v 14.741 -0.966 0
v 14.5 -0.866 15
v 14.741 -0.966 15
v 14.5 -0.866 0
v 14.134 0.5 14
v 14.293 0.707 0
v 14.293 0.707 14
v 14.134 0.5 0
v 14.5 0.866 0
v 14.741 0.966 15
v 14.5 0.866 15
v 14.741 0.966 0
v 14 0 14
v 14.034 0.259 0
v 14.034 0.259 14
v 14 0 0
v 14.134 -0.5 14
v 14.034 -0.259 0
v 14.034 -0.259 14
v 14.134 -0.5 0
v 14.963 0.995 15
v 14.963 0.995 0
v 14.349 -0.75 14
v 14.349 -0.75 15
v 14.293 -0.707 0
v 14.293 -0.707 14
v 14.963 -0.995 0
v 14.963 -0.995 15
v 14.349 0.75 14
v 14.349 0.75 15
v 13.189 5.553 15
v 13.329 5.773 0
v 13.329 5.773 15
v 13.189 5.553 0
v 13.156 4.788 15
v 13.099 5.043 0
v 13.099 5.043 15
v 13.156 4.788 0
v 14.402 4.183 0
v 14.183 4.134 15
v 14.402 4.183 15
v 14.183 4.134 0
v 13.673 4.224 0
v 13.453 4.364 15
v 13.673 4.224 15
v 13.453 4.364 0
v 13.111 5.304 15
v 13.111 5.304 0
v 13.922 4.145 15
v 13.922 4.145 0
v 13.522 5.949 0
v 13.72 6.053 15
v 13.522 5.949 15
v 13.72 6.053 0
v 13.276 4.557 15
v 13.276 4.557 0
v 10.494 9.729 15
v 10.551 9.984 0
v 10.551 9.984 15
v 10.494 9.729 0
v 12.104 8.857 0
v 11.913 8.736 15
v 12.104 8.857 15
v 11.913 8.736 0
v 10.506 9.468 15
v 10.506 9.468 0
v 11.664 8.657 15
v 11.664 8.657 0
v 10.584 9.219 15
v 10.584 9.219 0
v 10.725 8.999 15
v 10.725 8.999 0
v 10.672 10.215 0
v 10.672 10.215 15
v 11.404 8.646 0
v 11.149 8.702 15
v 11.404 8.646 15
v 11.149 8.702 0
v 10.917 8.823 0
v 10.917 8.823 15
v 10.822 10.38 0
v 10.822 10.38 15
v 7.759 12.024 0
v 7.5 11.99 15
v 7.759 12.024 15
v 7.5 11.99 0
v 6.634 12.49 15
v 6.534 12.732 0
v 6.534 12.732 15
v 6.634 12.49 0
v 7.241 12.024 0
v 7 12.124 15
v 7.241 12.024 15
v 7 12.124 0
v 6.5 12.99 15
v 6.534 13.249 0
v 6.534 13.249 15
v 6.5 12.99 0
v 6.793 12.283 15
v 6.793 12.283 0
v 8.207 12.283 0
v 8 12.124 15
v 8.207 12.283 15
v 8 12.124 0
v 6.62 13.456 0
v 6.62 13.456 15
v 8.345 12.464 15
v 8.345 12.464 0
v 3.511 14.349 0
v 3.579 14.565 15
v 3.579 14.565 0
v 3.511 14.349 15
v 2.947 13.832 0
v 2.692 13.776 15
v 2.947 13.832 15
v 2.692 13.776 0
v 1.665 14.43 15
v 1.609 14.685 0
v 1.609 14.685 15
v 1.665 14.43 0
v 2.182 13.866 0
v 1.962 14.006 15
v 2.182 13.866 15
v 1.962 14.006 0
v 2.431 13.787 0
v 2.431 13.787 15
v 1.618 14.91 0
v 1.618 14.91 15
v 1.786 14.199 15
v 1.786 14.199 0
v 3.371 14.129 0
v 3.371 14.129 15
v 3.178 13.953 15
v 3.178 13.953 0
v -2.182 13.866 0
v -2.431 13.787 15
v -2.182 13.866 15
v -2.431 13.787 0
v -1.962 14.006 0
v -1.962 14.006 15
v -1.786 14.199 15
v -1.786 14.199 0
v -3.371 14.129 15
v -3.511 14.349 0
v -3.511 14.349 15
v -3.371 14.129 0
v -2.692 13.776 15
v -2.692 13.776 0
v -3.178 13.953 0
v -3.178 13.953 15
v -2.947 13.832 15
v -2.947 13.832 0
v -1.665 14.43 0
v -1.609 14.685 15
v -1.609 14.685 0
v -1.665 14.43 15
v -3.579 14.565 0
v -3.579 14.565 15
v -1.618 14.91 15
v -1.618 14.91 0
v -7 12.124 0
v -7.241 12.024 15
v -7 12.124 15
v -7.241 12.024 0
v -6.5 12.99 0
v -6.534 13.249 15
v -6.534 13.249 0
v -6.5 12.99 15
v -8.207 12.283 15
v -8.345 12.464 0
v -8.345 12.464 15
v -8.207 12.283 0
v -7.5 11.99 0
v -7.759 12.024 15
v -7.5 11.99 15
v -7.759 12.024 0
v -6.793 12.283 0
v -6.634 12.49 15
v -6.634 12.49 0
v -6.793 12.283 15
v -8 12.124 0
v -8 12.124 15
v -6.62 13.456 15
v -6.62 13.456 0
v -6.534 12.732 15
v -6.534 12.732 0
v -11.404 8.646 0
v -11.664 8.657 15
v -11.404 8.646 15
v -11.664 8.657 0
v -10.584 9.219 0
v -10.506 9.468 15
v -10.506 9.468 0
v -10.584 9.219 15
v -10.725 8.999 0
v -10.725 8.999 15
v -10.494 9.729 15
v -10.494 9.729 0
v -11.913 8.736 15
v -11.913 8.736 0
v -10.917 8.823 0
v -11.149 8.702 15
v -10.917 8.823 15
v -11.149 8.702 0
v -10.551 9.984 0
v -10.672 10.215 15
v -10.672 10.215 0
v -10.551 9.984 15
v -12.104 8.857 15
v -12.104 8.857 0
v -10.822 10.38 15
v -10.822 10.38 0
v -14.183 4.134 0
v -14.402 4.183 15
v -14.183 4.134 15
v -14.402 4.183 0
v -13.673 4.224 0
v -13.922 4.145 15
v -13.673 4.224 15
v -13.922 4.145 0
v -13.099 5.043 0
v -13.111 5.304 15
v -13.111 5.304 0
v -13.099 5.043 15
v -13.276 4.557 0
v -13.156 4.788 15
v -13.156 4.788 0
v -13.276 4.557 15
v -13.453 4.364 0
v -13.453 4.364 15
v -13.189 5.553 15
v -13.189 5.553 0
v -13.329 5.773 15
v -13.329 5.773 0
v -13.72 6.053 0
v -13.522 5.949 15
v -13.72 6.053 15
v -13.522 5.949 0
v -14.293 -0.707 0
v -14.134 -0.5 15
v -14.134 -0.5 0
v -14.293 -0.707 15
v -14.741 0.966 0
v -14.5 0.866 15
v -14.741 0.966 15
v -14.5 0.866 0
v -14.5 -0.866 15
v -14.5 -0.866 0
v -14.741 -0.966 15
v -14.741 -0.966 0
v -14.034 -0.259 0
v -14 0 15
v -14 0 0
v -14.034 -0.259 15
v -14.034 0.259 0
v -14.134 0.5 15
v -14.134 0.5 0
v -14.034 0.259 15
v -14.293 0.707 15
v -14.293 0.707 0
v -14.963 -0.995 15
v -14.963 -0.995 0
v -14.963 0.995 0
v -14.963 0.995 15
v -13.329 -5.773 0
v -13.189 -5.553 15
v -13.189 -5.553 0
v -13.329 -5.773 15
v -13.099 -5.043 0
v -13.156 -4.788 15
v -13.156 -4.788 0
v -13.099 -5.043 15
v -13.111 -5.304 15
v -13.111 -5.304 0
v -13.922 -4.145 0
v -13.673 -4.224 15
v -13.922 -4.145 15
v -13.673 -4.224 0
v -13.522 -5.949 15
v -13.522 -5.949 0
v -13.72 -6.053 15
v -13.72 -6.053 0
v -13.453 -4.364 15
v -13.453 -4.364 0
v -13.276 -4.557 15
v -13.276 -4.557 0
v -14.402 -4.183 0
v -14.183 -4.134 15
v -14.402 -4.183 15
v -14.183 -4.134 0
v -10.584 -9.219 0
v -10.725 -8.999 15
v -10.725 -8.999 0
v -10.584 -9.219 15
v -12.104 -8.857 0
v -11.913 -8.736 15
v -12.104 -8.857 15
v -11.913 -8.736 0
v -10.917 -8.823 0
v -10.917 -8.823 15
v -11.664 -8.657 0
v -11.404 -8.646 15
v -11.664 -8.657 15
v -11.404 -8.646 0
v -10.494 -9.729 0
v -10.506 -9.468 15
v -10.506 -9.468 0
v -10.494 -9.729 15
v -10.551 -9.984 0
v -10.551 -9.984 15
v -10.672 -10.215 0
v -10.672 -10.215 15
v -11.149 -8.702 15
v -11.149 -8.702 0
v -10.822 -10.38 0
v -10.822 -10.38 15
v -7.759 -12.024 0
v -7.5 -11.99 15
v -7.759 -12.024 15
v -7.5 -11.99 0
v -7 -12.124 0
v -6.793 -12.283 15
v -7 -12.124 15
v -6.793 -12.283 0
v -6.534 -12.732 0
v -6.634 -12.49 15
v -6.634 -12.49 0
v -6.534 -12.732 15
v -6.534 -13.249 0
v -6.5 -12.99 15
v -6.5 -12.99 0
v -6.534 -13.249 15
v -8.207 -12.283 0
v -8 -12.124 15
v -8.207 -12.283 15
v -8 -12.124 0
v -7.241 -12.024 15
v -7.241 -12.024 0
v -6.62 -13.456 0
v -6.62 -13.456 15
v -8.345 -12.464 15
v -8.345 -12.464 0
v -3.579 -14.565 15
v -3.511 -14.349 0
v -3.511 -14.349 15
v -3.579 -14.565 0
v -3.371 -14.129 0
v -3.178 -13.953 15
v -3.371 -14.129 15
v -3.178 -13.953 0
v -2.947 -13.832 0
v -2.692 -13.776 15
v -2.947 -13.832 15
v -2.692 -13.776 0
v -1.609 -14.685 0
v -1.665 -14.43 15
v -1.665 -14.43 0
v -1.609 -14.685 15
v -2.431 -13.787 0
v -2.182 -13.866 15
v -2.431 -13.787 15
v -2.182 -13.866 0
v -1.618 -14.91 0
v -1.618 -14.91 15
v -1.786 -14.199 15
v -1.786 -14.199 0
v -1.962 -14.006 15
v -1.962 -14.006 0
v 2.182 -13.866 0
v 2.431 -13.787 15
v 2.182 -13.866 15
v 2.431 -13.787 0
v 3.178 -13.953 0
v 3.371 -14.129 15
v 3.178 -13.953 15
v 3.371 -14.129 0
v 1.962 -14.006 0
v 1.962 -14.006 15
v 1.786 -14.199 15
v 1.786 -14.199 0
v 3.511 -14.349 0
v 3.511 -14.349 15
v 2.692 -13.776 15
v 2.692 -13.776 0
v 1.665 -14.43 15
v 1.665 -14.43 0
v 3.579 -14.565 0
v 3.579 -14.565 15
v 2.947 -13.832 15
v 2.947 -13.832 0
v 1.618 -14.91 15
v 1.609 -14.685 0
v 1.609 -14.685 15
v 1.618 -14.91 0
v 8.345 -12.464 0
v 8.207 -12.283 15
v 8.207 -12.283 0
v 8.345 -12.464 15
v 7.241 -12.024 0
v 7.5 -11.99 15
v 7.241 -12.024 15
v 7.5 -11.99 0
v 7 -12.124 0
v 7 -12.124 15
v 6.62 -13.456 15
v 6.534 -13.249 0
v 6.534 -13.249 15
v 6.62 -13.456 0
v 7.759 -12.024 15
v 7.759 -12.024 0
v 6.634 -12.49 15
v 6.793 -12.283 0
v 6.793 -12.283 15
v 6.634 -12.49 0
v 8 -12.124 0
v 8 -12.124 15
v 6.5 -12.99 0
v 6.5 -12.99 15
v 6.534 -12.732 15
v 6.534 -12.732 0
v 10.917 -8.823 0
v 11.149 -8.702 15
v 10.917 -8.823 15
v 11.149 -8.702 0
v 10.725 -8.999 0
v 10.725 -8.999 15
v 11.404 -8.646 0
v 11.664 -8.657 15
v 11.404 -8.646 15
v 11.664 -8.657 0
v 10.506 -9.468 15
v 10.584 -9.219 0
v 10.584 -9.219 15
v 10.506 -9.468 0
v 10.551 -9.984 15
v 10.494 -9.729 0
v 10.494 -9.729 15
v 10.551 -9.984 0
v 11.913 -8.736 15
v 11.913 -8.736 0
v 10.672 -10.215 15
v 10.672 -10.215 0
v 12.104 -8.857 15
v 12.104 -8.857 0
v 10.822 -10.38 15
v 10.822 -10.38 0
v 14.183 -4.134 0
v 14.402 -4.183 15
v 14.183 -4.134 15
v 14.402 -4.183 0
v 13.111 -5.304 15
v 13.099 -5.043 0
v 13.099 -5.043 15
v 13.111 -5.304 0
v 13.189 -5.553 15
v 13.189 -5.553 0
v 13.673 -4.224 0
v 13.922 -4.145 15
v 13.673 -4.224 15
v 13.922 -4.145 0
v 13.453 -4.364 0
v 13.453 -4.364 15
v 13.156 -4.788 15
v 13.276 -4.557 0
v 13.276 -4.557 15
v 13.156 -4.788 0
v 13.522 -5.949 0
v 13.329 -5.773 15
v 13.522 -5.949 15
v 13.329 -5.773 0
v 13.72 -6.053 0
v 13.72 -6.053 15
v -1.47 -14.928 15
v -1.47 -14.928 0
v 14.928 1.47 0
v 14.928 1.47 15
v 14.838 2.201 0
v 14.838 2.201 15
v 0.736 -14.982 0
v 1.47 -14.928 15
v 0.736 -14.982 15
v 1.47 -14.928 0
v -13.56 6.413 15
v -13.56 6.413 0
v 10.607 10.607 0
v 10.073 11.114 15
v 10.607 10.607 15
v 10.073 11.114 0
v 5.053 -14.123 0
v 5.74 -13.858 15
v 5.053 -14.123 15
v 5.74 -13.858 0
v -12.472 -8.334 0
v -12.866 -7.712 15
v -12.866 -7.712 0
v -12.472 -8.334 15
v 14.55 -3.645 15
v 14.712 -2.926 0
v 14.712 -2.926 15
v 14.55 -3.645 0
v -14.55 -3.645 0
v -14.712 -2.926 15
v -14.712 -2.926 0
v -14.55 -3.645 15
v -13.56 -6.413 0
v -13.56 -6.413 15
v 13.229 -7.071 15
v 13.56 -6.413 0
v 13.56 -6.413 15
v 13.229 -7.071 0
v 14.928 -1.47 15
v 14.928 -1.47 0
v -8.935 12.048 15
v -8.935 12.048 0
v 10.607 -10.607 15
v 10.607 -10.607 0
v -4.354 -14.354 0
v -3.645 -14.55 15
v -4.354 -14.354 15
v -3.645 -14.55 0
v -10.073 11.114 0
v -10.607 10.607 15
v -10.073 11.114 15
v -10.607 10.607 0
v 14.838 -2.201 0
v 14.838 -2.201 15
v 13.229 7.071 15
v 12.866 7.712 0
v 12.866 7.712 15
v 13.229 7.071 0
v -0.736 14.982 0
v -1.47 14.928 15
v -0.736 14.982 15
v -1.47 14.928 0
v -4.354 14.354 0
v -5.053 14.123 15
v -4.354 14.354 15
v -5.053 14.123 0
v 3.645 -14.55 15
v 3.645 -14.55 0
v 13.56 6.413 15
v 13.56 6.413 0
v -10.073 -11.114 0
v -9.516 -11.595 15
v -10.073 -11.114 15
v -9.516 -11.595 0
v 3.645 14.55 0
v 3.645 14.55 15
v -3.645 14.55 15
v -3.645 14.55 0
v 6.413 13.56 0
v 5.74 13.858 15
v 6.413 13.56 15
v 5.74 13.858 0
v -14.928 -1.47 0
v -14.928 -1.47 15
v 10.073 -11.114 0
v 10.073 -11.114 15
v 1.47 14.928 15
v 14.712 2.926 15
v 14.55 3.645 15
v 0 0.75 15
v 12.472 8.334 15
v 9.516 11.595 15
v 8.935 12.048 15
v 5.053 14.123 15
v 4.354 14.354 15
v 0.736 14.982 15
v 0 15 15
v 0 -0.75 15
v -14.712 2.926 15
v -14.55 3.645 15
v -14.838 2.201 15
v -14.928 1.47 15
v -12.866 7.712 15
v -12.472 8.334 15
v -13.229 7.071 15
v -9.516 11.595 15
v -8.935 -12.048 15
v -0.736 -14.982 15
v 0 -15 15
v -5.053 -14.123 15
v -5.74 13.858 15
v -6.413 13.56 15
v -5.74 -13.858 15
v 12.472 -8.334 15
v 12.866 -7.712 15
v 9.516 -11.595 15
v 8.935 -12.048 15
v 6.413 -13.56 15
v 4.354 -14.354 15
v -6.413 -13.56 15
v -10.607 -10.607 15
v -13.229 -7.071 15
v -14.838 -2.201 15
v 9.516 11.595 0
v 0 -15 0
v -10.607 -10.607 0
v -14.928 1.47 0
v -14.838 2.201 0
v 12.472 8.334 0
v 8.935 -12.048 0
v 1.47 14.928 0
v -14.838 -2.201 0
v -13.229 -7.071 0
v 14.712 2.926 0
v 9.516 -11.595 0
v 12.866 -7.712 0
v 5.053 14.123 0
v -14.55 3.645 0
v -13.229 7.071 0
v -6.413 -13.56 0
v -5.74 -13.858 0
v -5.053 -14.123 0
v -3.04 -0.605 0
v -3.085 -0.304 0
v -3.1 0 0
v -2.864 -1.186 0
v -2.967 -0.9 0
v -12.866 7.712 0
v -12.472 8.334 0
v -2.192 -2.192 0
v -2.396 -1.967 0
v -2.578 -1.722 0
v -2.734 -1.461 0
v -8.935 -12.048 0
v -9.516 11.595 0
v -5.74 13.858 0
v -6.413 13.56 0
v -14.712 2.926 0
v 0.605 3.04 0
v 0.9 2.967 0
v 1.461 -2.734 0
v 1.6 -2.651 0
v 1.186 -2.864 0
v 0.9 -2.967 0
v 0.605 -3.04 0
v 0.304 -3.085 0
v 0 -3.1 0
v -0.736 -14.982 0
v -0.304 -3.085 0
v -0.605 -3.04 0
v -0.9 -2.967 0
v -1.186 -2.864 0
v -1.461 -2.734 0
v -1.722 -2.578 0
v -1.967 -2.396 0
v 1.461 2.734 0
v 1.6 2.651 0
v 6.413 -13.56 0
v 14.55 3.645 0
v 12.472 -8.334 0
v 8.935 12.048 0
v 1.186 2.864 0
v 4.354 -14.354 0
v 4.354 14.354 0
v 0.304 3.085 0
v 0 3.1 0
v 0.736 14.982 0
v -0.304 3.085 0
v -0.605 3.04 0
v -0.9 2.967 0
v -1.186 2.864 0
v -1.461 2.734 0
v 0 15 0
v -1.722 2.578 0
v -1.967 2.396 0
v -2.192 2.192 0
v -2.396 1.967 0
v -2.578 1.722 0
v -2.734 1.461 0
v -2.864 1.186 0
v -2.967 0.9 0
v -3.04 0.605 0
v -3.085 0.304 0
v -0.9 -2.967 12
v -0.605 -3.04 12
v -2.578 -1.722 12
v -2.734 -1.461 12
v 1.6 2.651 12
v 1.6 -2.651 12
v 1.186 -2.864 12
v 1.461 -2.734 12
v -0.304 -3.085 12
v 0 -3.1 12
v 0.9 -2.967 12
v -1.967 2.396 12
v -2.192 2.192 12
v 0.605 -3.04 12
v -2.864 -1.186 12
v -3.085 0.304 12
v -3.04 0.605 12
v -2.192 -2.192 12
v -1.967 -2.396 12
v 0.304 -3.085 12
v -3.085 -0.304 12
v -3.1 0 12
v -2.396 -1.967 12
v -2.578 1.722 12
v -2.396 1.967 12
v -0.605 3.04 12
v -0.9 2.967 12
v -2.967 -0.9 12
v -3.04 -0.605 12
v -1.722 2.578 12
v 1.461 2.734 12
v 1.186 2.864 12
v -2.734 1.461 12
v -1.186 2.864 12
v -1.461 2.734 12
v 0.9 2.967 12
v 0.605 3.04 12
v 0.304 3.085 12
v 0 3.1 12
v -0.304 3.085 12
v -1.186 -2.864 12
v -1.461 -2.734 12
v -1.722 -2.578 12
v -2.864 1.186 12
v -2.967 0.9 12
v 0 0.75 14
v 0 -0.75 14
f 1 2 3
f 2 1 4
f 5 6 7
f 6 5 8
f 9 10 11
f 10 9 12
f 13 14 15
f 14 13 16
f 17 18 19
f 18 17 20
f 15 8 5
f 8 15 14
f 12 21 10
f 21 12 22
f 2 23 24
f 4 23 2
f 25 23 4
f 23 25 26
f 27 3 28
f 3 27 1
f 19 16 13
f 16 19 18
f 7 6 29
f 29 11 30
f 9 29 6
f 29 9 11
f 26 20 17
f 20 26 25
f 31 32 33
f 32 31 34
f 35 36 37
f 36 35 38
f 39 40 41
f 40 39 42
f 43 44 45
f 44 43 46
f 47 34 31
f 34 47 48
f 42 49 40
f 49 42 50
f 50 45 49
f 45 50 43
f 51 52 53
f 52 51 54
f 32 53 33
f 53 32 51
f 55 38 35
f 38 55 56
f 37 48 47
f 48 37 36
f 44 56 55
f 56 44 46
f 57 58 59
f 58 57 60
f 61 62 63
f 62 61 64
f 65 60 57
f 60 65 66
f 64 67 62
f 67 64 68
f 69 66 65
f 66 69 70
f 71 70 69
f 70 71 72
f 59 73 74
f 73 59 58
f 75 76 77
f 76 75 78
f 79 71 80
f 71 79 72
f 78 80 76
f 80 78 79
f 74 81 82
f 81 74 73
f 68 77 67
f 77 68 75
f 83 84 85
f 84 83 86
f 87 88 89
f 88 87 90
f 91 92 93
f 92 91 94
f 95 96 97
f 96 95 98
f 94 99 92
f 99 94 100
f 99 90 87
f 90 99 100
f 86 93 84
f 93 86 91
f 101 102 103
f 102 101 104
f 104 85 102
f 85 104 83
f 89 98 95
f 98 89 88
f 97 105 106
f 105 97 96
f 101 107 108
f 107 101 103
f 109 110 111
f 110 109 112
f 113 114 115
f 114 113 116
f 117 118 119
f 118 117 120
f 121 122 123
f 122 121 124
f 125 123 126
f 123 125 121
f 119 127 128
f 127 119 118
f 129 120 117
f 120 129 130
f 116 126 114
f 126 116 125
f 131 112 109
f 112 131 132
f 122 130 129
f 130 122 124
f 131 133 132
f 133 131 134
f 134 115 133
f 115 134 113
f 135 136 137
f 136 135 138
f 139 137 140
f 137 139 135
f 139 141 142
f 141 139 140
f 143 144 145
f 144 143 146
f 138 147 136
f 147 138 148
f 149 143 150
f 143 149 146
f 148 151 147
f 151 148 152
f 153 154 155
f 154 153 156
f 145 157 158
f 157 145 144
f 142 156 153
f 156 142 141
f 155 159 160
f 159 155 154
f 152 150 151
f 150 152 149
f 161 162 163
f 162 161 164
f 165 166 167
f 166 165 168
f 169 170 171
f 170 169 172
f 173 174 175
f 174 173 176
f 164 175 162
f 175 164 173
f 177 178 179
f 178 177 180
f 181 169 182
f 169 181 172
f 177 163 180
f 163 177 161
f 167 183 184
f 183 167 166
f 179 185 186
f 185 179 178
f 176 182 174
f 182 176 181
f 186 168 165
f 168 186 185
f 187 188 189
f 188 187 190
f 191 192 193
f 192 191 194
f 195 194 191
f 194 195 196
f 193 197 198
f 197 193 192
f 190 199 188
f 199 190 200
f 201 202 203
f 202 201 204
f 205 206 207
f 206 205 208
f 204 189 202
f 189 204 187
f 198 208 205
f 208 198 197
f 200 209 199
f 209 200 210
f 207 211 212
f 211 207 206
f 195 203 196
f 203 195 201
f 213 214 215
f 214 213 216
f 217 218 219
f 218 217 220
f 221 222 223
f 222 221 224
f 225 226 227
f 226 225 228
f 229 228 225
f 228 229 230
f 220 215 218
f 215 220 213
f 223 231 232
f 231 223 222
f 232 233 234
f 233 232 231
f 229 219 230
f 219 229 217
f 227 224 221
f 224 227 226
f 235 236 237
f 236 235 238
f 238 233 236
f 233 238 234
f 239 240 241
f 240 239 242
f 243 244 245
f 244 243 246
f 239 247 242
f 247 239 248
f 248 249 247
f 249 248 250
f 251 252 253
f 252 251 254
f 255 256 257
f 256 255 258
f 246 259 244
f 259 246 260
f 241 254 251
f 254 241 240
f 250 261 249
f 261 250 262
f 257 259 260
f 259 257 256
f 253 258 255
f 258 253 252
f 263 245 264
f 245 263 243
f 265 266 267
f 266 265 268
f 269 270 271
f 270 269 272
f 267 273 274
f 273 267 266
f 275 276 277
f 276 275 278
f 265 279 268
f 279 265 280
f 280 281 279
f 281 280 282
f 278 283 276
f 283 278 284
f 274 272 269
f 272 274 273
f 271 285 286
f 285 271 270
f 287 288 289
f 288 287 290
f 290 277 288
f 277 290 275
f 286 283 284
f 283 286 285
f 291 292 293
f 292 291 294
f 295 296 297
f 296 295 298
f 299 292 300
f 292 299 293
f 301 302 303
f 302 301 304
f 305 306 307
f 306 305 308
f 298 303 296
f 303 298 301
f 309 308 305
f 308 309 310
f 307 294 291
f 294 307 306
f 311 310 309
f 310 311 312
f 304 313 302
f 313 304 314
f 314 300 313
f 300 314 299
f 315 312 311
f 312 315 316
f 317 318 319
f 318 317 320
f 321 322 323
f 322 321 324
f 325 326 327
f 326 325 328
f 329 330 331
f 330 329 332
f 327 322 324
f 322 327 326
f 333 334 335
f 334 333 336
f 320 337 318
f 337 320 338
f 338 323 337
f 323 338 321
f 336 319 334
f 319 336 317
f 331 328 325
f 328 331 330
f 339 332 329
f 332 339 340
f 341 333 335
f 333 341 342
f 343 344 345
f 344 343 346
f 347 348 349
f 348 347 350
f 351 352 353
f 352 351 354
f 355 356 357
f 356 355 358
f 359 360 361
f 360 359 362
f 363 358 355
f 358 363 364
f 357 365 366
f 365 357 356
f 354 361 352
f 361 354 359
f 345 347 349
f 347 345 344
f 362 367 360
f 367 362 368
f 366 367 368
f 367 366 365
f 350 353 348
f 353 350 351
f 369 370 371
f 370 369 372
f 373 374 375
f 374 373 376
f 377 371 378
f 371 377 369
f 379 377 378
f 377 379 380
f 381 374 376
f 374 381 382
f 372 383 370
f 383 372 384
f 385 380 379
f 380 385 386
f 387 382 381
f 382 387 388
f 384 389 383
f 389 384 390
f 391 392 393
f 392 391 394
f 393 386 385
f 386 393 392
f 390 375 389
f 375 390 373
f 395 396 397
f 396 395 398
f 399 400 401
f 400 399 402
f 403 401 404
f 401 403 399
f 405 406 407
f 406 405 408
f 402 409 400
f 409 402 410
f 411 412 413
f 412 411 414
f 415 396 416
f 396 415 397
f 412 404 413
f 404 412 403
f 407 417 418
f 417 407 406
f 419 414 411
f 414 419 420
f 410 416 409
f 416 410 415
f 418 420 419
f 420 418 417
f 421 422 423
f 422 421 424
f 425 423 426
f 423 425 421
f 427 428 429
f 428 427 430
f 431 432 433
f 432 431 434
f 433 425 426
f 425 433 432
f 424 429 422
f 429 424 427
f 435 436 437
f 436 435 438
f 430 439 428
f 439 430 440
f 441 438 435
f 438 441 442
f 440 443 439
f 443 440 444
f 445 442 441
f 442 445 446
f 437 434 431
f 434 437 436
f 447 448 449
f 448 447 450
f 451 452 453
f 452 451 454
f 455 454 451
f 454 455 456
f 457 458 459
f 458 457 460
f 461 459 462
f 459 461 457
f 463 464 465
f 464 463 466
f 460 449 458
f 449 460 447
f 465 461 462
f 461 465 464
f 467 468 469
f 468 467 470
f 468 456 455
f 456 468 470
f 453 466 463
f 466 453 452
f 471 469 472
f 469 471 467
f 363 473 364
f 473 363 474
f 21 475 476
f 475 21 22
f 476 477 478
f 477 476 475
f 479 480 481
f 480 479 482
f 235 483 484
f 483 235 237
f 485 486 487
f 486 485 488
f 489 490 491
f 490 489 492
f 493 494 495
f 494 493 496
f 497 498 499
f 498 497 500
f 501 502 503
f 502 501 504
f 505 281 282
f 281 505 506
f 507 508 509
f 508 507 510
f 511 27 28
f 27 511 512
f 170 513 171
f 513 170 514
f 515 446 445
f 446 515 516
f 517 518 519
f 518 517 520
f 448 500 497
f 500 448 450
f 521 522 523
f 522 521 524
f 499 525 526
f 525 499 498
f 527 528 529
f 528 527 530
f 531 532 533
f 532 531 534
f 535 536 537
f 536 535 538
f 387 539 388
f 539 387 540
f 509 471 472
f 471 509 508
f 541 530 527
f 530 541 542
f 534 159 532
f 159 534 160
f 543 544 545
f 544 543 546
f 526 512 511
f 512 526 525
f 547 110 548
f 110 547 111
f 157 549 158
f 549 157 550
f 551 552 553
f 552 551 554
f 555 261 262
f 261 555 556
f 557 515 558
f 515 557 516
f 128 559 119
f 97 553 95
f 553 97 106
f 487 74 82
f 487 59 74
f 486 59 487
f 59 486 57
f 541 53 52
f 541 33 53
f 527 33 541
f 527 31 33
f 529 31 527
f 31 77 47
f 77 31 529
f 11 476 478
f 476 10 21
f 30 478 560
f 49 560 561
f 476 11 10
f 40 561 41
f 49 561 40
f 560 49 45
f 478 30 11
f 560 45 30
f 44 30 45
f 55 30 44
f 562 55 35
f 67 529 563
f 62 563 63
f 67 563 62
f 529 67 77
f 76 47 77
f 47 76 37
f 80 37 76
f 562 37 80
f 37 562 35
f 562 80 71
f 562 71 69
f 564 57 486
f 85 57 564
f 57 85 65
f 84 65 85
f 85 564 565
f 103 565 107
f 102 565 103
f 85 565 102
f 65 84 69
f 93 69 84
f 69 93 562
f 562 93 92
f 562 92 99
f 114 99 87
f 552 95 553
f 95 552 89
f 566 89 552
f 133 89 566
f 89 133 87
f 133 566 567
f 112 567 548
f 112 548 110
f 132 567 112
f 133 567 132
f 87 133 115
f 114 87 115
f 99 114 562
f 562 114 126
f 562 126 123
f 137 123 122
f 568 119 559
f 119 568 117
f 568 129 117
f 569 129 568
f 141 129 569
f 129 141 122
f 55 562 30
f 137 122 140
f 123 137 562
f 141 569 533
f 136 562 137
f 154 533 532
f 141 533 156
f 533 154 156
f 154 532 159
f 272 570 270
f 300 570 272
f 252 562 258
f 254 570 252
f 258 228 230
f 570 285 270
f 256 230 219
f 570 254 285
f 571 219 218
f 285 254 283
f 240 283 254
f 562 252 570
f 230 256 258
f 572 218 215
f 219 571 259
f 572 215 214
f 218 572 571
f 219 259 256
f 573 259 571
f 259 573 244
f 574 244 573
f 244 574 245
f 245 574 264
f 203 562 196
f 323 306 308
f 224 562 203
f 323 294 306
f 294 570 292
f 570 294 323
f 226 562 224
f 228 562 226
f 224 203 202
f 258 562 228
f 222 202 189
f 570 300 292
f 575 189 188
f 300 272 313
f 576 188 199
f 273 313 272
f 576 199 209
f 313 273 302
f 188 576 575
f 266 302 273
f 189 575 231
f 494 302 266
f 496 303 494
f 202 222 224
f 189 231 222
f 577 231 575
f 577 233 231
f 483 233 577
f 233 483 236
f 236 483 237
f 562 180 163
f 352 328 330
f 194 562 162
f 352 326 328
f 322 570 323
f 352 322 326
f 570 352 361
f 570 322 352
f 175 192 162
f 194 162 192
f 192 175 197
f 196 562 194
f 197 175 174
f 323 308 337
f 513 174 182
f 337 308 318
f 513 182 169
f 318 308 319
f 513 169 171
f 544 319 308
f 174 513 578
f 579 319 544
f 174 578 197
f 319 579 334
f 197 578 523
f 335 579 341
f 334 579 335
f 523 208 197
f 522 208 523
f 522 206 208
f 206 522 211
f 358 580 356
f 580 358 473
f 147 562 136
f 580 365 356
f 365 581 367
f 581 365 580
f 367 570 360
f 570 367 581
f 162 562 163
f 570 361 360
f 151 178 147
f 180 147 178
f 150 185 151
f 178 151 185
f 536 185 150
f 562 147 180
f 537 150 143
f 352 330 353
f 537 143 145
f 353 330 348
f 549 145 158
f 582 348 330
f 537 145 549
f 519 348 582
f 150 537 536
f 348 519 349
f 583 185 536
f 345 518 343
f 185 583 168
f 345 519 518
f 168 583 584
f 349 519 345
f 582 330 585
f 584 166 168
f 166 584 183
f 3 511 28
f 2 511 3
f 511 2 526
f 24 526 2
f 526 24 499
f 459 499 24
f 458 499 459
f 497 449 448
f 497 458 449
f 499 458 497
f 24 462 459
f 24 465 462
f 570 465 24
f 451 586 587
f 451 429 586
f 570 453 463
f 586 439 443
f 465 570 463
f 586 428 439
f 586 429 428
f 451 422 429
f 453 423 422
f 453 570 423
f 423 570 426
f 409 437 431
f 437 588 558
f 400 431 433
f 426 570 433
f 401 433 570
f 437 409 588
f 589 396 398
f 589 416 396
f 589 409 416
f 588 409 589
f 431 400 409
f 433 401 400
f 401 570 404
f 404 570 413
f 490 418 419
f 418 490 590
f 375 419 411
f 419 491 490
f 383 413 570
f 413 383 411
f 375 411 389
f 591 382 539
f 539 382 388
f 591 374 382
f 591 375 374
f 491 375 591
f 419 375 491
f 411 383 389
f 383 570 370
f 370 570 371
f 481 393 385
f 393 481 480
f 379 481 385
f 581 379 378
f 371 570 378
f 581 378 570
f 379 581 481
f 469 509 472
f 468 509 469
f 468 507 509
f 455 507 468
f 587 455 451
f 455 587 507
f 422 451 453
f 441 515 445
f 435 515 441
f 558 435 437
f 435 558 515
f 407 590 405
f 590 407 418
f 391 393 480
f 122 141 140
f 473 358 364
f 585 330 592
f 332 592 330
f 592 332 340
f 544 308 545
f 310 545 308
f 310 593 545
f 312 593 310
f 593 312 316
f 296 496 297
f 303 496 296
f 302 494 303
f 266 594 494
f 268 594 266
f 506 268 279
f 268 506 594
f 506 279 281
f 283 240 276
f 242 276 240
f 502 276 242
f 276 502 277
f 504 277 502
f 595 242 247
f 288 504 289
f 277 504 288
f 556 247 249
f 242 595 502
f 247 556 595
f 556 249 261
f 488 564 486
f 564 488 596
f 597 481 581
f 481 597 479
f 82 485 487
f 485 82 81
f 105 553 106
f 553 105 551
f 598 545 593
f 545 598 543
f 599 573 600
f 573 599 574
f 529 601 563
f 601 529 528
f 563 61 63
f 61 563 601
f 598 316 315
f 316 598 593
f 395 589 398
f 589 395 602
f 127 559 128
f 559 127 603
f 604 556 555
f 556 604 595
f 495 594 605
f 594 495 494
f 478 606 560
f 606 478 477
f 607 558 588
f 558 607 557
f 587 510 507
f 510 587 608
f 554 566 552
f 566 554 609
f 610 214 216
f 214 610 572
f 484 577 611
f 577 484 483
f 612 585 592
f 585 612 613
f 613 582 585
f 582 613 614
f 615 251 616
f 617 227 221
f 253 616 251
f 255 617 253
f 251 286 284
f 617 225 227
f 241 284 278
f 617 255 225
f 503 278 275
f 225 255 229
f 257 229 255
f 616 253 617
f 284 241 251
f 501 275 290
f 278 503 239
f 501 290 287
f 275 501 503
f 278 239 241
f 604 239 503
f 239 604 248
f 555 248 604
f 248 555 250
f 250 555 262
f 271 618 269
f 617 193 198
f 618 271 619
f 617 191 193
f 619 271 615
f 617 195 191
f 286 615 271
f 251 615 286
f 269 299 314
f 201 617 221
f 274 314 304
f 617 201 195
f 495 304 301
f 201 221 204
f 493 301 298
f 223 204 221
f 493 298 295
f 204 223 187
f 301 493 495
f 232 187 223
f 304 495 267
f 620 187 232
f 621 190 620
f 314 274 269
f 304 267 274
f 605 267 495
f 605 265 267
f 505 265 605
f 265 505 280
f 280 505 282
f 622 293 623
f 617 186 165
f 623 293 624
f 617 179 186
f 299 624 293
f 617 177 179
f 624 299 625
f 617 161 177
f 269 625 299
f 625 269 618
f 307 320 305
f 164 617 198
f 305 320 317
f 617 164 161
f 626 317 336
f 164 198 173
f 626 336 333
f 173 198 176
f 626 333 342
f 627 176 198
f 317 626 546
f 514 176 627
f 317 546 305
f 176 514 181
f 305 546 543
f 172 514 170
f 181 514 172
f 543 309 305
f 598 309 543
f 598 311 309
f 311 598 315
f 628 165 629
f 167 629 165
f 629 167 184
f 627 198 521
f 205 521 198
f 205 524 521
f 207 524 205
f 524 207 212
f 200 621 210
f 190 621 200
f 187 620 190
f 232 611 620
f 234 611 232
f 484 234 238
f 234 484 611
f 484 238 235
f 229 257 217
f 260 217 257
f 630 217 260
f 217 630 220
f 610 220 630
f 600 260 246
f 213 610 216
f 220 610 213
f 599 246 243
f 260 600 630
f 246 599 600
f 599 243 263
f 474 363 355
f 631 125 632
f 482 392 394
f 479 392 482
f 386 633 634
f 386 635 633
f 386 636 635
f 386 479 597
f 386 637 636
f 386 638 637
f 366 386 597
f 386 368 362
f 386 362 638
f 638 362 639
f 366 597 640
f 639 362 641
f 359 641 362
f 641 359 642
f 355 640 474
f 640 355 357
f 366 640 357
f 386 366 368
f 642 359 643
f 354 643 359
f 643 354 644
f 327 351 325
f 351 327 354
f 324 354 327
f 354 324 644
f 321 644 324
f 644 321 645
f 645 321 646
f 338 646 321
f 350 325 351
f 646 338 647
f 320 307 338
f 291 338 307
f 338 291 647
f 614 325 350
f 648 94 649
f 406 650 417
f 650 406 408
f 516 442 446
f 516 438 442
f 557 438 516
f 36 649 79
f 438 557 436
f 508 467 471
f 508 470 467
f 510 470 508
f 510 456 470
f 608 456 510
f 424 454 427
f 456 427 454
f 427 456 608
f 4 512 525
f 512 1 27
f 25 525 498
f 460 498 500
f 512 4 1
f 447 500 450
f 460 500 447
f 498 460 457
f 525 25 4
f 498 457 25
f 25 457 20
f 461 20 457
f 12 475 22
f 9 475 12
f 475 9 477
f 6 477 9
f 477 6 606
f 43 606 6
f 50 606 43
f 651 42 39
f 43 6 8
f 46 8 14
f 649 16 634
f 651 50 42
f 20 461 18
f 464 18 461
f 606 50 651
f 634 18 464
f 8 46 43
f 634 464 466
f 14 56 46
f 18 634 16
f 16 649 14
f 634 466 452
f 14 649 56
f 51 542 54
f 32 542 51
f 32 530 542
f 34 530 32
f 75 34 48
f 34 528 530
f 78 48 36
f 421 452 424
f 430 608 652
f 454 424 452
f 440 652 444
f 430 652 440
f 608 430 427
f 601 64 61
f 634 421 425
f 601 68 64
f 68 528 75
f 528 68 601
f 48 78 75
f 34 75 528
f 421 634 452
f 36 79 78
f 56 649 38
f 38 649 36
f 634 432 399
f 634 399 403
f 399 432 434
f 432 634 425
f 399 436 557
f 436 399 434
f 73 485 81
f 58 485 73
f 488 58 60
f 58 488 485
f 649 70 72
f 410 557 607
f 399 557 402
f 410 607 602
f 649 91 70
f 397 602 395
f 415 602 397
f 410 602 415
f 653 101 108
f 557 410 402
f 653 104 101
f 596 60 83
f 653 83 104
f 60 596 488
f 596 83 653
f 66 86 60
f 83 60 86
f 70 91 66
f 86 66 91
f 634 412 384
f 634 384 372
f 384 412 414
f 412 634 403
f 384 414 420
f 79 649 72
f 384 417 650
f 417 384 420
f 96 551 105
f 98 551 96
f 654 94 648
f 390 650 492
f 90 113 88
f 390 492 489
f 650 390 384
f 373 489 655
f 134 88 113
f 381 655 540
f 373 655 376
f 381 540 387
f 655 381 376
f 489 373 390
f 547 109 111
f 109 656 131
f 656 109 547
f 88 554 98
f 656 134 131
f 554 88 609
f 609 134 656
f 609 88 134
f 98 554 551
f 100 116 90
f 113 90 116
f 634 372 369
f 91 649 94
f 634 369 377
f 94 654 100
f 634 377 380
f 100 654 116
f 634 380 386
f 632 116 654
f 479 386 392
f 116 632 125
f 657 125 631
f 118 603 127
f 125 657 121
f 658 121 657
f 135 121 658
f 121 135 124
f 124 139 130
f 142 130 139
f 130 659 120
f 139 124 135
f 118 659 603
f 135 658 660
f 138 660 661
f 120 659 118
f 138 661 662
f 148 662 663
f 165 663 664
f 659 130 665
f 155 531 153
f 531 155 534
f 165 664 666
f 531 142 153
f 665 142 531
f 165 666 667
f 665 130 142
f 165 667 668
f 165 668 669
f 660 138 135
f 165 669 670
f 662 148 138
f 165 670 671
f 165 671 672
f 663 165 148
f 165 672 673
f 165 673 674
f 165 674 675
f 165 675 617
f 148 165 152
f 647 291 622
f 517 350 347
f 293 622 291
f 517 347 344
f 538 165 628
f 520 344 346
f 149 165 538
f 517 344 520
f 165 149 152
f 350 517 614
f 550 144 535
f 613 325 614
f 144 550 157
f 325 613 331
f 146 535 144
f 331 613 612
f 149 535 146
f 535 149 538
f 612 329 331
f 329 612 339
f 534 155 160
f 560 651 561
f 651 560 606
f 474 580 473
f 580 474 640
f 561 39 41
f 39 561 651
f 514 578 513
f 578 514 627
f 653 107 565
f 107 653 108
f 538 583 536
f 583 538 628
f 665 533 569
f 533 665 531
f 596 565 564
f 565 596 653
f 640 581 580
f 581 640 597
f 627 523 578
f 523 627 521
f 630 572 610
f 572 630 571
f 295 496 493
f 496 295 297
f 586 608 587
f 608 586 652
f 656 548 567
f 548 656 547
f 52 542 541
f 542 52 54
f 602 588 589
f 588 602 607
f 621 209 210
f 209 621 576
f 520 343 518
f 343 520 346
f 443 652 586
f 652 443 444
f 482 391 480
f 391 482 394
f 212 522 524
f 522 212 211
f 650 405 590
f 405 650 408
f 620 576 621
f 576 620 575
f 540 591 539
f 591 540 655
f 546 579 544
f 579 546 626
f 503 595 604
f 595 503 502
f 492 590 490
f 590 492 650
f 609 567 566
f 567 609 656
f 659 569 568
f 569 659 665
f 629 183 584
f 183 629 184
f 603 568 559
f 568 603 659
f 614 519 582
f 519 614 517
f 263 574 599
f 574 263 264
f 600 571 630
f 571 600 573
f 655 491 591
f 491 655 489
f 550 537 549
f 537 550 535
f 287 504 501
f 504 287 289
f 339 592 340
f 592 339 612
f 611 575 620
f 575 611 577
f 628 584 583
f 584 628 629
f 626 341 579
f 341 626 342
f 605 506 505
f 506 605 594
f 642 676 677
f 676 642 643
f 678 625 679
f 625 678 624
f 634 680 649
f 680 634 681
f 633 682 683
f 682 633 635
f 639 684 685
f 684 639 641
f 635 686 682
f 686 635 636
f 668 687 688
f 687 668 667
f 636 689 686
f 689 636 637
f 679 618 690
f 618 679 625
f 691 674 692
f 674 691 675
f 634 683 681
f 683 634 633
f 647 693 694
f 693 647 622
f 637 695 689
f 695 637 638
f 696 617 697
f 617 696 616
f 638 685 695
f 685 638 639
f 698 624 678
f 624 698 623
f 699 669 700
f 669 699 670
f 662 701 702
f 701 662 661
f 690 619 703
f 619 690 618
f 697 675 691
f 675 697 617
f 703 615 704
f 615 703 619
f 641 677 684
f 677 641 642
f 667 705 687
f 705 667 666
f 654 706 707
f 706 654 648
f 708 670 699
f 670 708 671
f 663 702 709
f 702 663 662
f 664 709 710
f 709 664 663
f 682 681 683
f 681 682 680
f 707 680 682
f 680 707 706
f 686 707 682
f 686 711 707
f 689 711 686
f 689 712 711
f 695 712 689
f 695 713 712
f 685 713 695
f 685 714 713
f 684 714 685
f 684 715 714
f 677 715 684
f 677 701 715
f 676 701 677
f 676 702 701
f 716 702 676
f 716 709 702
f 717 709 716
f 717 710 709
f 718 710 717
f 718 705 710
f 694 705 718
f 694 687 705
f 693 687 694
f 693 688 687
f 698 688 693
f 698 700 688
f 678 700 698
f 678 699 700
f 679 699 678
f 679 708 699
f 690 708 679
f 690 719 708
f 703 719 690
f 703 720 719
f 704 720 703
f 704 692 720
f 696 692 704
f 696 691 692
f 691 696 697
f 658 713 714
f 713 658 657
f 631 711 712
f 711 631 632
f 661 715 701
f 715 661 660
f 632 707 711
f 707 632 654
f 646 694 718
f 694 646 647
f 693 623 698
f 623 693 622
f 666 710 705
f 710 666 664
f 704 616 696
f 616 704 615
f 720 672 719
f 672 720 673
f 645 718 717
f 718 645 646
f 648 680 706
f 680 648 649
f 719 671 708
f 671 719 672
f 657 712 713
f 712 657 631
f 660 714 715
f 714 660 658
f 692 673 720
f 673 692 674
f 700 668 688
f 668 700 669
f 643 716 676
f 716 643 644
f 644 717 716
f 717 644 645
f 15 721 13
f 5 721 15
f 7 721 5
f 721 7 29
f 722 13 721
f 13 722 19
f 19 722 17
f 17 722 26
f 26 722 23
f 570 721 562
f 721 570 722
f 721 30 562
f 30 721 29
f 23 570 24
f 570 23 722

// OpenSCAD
// Replacement knob for a 6 mm D-shaft (hotplates, stirrers, power supplies)
// Category: quick fixes. D-shaped blind bore from the bottom, grip grooves and a
// pointer groove on top that lines up with the flat of the shaft.
// Print: PETG (heat near hotplates), 0.15 mm layers, 4 perimeters, bore face down.
// SPDX-License-Identifier: CERN-OHL-P-2.0

/* [Knob] */
knob_d = 30;
knob_h = 15;
shaft_d = 6.2;         // 6 mm shaft + 0.2 mm clearance
shaft_flat = 4.7;      // flat-to-round distance (4.5 mm nominal + clearance)
bore_depth = 12;
n_grooves = 18;
groove_d = 2;
pointer_w = 1.5;
pointer_depth = 1;

/* [Hidden] */
eps = 0.01;

difference() {
    cylinder(d = knob_d, h = knob_h, $fn = 128);
    // D-shaped bore; the flat faces +X
    translate([0, 0, -eps])
        linear_extrude(bore_depth + eps)
            intersection() {
                circle(d = shaft_d, $fn = 64);
                translate([-shaft_d / 2, -shaft_d / 2]) square([shaft_flat, shaft_d]);
            }
    // grip grooves
    for (i = [0 : n_grooves - 1])
        rotate(i * 360 / n_grooves)
            translate([knob_d / 2, 0, -eps]) cylinder(d = groove_d, h = knob_h + 2 * eps, $fn = 24);
    // pointer groove on top, pointing at the flat (+X)
    translate([0, -pointer_w / 2, knob_h - pointer_depth])
        cube([knob_d / 2 + 1, pointer_w, pointer_depth + eps]);
}
